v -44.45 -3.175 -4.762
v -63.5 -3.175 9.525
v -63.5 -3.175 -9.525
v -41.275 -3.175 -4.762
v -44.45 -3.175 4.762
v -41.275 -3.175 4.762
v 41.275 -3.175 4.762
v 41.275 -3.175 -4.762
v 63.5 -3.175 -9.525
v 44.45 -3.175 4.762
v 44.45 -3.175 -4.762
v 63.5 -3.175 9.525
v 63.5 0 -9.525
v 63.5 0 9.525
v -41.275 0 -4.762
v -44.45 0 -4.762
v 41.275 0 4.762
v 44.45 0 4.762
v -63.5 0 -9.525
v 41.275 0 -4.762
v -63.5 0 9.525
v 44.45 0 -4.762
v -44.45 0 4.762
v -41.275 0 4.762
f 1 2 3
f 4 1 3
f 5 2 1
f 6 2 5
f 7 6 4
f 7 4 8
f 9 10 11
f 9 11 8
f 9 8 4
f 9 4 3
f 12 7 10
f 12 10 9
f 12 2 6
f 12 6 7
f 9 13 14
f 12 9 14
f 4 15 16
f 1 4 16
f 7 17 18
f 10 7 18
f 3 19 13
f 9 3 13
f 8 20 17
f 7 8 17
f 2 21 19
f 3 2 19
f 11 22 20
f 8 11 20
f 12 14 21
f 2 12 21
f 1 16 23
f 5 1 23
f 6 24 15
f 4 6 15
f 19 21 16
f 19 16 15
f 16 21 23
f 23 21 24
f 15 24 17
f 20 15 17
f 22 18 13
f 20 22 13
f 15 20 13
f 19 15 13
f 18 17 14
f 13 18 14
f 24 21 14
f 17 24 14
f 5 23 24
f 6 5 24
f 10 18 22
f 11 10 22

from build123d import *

# Parameters (mm, degrees)
F1_DEPTH = 3.175


with BuildPart() as f1:
    # F0 (on Front) → F1 (new body)
    with BuildSketch(Plane.XZ):
        Polygon((-63.5, 9.525), (-63.5, 0), (-44.45, 0), (-44.45, 4.7625), (-41.275, 4.7625), (-41.275, 0), (0, 0), (41.275, 0), (41.275, 4.7625), (44.45, 4.7625), (44.45, 0), (63.5, 0), (63.5, 9.525), align=None)
        Polygon((-44.45, 0), (-63.5, 0), (-63.5, -9.525), (0, -9.525), (0, 0), (-41.275, 0), (-41.275, -4.7625), (-44.45, -4.7625), align=None)
        Polygon((0, 0), (0, -9.525), (63.5, -9.525), (63.5, 0), (44.45, 0), (44.45, -4.7625), (41.275, -4.7625), (41.275, 0), align=None)
    extrude(amount=F1_DEPTH)


solid = f1.part
